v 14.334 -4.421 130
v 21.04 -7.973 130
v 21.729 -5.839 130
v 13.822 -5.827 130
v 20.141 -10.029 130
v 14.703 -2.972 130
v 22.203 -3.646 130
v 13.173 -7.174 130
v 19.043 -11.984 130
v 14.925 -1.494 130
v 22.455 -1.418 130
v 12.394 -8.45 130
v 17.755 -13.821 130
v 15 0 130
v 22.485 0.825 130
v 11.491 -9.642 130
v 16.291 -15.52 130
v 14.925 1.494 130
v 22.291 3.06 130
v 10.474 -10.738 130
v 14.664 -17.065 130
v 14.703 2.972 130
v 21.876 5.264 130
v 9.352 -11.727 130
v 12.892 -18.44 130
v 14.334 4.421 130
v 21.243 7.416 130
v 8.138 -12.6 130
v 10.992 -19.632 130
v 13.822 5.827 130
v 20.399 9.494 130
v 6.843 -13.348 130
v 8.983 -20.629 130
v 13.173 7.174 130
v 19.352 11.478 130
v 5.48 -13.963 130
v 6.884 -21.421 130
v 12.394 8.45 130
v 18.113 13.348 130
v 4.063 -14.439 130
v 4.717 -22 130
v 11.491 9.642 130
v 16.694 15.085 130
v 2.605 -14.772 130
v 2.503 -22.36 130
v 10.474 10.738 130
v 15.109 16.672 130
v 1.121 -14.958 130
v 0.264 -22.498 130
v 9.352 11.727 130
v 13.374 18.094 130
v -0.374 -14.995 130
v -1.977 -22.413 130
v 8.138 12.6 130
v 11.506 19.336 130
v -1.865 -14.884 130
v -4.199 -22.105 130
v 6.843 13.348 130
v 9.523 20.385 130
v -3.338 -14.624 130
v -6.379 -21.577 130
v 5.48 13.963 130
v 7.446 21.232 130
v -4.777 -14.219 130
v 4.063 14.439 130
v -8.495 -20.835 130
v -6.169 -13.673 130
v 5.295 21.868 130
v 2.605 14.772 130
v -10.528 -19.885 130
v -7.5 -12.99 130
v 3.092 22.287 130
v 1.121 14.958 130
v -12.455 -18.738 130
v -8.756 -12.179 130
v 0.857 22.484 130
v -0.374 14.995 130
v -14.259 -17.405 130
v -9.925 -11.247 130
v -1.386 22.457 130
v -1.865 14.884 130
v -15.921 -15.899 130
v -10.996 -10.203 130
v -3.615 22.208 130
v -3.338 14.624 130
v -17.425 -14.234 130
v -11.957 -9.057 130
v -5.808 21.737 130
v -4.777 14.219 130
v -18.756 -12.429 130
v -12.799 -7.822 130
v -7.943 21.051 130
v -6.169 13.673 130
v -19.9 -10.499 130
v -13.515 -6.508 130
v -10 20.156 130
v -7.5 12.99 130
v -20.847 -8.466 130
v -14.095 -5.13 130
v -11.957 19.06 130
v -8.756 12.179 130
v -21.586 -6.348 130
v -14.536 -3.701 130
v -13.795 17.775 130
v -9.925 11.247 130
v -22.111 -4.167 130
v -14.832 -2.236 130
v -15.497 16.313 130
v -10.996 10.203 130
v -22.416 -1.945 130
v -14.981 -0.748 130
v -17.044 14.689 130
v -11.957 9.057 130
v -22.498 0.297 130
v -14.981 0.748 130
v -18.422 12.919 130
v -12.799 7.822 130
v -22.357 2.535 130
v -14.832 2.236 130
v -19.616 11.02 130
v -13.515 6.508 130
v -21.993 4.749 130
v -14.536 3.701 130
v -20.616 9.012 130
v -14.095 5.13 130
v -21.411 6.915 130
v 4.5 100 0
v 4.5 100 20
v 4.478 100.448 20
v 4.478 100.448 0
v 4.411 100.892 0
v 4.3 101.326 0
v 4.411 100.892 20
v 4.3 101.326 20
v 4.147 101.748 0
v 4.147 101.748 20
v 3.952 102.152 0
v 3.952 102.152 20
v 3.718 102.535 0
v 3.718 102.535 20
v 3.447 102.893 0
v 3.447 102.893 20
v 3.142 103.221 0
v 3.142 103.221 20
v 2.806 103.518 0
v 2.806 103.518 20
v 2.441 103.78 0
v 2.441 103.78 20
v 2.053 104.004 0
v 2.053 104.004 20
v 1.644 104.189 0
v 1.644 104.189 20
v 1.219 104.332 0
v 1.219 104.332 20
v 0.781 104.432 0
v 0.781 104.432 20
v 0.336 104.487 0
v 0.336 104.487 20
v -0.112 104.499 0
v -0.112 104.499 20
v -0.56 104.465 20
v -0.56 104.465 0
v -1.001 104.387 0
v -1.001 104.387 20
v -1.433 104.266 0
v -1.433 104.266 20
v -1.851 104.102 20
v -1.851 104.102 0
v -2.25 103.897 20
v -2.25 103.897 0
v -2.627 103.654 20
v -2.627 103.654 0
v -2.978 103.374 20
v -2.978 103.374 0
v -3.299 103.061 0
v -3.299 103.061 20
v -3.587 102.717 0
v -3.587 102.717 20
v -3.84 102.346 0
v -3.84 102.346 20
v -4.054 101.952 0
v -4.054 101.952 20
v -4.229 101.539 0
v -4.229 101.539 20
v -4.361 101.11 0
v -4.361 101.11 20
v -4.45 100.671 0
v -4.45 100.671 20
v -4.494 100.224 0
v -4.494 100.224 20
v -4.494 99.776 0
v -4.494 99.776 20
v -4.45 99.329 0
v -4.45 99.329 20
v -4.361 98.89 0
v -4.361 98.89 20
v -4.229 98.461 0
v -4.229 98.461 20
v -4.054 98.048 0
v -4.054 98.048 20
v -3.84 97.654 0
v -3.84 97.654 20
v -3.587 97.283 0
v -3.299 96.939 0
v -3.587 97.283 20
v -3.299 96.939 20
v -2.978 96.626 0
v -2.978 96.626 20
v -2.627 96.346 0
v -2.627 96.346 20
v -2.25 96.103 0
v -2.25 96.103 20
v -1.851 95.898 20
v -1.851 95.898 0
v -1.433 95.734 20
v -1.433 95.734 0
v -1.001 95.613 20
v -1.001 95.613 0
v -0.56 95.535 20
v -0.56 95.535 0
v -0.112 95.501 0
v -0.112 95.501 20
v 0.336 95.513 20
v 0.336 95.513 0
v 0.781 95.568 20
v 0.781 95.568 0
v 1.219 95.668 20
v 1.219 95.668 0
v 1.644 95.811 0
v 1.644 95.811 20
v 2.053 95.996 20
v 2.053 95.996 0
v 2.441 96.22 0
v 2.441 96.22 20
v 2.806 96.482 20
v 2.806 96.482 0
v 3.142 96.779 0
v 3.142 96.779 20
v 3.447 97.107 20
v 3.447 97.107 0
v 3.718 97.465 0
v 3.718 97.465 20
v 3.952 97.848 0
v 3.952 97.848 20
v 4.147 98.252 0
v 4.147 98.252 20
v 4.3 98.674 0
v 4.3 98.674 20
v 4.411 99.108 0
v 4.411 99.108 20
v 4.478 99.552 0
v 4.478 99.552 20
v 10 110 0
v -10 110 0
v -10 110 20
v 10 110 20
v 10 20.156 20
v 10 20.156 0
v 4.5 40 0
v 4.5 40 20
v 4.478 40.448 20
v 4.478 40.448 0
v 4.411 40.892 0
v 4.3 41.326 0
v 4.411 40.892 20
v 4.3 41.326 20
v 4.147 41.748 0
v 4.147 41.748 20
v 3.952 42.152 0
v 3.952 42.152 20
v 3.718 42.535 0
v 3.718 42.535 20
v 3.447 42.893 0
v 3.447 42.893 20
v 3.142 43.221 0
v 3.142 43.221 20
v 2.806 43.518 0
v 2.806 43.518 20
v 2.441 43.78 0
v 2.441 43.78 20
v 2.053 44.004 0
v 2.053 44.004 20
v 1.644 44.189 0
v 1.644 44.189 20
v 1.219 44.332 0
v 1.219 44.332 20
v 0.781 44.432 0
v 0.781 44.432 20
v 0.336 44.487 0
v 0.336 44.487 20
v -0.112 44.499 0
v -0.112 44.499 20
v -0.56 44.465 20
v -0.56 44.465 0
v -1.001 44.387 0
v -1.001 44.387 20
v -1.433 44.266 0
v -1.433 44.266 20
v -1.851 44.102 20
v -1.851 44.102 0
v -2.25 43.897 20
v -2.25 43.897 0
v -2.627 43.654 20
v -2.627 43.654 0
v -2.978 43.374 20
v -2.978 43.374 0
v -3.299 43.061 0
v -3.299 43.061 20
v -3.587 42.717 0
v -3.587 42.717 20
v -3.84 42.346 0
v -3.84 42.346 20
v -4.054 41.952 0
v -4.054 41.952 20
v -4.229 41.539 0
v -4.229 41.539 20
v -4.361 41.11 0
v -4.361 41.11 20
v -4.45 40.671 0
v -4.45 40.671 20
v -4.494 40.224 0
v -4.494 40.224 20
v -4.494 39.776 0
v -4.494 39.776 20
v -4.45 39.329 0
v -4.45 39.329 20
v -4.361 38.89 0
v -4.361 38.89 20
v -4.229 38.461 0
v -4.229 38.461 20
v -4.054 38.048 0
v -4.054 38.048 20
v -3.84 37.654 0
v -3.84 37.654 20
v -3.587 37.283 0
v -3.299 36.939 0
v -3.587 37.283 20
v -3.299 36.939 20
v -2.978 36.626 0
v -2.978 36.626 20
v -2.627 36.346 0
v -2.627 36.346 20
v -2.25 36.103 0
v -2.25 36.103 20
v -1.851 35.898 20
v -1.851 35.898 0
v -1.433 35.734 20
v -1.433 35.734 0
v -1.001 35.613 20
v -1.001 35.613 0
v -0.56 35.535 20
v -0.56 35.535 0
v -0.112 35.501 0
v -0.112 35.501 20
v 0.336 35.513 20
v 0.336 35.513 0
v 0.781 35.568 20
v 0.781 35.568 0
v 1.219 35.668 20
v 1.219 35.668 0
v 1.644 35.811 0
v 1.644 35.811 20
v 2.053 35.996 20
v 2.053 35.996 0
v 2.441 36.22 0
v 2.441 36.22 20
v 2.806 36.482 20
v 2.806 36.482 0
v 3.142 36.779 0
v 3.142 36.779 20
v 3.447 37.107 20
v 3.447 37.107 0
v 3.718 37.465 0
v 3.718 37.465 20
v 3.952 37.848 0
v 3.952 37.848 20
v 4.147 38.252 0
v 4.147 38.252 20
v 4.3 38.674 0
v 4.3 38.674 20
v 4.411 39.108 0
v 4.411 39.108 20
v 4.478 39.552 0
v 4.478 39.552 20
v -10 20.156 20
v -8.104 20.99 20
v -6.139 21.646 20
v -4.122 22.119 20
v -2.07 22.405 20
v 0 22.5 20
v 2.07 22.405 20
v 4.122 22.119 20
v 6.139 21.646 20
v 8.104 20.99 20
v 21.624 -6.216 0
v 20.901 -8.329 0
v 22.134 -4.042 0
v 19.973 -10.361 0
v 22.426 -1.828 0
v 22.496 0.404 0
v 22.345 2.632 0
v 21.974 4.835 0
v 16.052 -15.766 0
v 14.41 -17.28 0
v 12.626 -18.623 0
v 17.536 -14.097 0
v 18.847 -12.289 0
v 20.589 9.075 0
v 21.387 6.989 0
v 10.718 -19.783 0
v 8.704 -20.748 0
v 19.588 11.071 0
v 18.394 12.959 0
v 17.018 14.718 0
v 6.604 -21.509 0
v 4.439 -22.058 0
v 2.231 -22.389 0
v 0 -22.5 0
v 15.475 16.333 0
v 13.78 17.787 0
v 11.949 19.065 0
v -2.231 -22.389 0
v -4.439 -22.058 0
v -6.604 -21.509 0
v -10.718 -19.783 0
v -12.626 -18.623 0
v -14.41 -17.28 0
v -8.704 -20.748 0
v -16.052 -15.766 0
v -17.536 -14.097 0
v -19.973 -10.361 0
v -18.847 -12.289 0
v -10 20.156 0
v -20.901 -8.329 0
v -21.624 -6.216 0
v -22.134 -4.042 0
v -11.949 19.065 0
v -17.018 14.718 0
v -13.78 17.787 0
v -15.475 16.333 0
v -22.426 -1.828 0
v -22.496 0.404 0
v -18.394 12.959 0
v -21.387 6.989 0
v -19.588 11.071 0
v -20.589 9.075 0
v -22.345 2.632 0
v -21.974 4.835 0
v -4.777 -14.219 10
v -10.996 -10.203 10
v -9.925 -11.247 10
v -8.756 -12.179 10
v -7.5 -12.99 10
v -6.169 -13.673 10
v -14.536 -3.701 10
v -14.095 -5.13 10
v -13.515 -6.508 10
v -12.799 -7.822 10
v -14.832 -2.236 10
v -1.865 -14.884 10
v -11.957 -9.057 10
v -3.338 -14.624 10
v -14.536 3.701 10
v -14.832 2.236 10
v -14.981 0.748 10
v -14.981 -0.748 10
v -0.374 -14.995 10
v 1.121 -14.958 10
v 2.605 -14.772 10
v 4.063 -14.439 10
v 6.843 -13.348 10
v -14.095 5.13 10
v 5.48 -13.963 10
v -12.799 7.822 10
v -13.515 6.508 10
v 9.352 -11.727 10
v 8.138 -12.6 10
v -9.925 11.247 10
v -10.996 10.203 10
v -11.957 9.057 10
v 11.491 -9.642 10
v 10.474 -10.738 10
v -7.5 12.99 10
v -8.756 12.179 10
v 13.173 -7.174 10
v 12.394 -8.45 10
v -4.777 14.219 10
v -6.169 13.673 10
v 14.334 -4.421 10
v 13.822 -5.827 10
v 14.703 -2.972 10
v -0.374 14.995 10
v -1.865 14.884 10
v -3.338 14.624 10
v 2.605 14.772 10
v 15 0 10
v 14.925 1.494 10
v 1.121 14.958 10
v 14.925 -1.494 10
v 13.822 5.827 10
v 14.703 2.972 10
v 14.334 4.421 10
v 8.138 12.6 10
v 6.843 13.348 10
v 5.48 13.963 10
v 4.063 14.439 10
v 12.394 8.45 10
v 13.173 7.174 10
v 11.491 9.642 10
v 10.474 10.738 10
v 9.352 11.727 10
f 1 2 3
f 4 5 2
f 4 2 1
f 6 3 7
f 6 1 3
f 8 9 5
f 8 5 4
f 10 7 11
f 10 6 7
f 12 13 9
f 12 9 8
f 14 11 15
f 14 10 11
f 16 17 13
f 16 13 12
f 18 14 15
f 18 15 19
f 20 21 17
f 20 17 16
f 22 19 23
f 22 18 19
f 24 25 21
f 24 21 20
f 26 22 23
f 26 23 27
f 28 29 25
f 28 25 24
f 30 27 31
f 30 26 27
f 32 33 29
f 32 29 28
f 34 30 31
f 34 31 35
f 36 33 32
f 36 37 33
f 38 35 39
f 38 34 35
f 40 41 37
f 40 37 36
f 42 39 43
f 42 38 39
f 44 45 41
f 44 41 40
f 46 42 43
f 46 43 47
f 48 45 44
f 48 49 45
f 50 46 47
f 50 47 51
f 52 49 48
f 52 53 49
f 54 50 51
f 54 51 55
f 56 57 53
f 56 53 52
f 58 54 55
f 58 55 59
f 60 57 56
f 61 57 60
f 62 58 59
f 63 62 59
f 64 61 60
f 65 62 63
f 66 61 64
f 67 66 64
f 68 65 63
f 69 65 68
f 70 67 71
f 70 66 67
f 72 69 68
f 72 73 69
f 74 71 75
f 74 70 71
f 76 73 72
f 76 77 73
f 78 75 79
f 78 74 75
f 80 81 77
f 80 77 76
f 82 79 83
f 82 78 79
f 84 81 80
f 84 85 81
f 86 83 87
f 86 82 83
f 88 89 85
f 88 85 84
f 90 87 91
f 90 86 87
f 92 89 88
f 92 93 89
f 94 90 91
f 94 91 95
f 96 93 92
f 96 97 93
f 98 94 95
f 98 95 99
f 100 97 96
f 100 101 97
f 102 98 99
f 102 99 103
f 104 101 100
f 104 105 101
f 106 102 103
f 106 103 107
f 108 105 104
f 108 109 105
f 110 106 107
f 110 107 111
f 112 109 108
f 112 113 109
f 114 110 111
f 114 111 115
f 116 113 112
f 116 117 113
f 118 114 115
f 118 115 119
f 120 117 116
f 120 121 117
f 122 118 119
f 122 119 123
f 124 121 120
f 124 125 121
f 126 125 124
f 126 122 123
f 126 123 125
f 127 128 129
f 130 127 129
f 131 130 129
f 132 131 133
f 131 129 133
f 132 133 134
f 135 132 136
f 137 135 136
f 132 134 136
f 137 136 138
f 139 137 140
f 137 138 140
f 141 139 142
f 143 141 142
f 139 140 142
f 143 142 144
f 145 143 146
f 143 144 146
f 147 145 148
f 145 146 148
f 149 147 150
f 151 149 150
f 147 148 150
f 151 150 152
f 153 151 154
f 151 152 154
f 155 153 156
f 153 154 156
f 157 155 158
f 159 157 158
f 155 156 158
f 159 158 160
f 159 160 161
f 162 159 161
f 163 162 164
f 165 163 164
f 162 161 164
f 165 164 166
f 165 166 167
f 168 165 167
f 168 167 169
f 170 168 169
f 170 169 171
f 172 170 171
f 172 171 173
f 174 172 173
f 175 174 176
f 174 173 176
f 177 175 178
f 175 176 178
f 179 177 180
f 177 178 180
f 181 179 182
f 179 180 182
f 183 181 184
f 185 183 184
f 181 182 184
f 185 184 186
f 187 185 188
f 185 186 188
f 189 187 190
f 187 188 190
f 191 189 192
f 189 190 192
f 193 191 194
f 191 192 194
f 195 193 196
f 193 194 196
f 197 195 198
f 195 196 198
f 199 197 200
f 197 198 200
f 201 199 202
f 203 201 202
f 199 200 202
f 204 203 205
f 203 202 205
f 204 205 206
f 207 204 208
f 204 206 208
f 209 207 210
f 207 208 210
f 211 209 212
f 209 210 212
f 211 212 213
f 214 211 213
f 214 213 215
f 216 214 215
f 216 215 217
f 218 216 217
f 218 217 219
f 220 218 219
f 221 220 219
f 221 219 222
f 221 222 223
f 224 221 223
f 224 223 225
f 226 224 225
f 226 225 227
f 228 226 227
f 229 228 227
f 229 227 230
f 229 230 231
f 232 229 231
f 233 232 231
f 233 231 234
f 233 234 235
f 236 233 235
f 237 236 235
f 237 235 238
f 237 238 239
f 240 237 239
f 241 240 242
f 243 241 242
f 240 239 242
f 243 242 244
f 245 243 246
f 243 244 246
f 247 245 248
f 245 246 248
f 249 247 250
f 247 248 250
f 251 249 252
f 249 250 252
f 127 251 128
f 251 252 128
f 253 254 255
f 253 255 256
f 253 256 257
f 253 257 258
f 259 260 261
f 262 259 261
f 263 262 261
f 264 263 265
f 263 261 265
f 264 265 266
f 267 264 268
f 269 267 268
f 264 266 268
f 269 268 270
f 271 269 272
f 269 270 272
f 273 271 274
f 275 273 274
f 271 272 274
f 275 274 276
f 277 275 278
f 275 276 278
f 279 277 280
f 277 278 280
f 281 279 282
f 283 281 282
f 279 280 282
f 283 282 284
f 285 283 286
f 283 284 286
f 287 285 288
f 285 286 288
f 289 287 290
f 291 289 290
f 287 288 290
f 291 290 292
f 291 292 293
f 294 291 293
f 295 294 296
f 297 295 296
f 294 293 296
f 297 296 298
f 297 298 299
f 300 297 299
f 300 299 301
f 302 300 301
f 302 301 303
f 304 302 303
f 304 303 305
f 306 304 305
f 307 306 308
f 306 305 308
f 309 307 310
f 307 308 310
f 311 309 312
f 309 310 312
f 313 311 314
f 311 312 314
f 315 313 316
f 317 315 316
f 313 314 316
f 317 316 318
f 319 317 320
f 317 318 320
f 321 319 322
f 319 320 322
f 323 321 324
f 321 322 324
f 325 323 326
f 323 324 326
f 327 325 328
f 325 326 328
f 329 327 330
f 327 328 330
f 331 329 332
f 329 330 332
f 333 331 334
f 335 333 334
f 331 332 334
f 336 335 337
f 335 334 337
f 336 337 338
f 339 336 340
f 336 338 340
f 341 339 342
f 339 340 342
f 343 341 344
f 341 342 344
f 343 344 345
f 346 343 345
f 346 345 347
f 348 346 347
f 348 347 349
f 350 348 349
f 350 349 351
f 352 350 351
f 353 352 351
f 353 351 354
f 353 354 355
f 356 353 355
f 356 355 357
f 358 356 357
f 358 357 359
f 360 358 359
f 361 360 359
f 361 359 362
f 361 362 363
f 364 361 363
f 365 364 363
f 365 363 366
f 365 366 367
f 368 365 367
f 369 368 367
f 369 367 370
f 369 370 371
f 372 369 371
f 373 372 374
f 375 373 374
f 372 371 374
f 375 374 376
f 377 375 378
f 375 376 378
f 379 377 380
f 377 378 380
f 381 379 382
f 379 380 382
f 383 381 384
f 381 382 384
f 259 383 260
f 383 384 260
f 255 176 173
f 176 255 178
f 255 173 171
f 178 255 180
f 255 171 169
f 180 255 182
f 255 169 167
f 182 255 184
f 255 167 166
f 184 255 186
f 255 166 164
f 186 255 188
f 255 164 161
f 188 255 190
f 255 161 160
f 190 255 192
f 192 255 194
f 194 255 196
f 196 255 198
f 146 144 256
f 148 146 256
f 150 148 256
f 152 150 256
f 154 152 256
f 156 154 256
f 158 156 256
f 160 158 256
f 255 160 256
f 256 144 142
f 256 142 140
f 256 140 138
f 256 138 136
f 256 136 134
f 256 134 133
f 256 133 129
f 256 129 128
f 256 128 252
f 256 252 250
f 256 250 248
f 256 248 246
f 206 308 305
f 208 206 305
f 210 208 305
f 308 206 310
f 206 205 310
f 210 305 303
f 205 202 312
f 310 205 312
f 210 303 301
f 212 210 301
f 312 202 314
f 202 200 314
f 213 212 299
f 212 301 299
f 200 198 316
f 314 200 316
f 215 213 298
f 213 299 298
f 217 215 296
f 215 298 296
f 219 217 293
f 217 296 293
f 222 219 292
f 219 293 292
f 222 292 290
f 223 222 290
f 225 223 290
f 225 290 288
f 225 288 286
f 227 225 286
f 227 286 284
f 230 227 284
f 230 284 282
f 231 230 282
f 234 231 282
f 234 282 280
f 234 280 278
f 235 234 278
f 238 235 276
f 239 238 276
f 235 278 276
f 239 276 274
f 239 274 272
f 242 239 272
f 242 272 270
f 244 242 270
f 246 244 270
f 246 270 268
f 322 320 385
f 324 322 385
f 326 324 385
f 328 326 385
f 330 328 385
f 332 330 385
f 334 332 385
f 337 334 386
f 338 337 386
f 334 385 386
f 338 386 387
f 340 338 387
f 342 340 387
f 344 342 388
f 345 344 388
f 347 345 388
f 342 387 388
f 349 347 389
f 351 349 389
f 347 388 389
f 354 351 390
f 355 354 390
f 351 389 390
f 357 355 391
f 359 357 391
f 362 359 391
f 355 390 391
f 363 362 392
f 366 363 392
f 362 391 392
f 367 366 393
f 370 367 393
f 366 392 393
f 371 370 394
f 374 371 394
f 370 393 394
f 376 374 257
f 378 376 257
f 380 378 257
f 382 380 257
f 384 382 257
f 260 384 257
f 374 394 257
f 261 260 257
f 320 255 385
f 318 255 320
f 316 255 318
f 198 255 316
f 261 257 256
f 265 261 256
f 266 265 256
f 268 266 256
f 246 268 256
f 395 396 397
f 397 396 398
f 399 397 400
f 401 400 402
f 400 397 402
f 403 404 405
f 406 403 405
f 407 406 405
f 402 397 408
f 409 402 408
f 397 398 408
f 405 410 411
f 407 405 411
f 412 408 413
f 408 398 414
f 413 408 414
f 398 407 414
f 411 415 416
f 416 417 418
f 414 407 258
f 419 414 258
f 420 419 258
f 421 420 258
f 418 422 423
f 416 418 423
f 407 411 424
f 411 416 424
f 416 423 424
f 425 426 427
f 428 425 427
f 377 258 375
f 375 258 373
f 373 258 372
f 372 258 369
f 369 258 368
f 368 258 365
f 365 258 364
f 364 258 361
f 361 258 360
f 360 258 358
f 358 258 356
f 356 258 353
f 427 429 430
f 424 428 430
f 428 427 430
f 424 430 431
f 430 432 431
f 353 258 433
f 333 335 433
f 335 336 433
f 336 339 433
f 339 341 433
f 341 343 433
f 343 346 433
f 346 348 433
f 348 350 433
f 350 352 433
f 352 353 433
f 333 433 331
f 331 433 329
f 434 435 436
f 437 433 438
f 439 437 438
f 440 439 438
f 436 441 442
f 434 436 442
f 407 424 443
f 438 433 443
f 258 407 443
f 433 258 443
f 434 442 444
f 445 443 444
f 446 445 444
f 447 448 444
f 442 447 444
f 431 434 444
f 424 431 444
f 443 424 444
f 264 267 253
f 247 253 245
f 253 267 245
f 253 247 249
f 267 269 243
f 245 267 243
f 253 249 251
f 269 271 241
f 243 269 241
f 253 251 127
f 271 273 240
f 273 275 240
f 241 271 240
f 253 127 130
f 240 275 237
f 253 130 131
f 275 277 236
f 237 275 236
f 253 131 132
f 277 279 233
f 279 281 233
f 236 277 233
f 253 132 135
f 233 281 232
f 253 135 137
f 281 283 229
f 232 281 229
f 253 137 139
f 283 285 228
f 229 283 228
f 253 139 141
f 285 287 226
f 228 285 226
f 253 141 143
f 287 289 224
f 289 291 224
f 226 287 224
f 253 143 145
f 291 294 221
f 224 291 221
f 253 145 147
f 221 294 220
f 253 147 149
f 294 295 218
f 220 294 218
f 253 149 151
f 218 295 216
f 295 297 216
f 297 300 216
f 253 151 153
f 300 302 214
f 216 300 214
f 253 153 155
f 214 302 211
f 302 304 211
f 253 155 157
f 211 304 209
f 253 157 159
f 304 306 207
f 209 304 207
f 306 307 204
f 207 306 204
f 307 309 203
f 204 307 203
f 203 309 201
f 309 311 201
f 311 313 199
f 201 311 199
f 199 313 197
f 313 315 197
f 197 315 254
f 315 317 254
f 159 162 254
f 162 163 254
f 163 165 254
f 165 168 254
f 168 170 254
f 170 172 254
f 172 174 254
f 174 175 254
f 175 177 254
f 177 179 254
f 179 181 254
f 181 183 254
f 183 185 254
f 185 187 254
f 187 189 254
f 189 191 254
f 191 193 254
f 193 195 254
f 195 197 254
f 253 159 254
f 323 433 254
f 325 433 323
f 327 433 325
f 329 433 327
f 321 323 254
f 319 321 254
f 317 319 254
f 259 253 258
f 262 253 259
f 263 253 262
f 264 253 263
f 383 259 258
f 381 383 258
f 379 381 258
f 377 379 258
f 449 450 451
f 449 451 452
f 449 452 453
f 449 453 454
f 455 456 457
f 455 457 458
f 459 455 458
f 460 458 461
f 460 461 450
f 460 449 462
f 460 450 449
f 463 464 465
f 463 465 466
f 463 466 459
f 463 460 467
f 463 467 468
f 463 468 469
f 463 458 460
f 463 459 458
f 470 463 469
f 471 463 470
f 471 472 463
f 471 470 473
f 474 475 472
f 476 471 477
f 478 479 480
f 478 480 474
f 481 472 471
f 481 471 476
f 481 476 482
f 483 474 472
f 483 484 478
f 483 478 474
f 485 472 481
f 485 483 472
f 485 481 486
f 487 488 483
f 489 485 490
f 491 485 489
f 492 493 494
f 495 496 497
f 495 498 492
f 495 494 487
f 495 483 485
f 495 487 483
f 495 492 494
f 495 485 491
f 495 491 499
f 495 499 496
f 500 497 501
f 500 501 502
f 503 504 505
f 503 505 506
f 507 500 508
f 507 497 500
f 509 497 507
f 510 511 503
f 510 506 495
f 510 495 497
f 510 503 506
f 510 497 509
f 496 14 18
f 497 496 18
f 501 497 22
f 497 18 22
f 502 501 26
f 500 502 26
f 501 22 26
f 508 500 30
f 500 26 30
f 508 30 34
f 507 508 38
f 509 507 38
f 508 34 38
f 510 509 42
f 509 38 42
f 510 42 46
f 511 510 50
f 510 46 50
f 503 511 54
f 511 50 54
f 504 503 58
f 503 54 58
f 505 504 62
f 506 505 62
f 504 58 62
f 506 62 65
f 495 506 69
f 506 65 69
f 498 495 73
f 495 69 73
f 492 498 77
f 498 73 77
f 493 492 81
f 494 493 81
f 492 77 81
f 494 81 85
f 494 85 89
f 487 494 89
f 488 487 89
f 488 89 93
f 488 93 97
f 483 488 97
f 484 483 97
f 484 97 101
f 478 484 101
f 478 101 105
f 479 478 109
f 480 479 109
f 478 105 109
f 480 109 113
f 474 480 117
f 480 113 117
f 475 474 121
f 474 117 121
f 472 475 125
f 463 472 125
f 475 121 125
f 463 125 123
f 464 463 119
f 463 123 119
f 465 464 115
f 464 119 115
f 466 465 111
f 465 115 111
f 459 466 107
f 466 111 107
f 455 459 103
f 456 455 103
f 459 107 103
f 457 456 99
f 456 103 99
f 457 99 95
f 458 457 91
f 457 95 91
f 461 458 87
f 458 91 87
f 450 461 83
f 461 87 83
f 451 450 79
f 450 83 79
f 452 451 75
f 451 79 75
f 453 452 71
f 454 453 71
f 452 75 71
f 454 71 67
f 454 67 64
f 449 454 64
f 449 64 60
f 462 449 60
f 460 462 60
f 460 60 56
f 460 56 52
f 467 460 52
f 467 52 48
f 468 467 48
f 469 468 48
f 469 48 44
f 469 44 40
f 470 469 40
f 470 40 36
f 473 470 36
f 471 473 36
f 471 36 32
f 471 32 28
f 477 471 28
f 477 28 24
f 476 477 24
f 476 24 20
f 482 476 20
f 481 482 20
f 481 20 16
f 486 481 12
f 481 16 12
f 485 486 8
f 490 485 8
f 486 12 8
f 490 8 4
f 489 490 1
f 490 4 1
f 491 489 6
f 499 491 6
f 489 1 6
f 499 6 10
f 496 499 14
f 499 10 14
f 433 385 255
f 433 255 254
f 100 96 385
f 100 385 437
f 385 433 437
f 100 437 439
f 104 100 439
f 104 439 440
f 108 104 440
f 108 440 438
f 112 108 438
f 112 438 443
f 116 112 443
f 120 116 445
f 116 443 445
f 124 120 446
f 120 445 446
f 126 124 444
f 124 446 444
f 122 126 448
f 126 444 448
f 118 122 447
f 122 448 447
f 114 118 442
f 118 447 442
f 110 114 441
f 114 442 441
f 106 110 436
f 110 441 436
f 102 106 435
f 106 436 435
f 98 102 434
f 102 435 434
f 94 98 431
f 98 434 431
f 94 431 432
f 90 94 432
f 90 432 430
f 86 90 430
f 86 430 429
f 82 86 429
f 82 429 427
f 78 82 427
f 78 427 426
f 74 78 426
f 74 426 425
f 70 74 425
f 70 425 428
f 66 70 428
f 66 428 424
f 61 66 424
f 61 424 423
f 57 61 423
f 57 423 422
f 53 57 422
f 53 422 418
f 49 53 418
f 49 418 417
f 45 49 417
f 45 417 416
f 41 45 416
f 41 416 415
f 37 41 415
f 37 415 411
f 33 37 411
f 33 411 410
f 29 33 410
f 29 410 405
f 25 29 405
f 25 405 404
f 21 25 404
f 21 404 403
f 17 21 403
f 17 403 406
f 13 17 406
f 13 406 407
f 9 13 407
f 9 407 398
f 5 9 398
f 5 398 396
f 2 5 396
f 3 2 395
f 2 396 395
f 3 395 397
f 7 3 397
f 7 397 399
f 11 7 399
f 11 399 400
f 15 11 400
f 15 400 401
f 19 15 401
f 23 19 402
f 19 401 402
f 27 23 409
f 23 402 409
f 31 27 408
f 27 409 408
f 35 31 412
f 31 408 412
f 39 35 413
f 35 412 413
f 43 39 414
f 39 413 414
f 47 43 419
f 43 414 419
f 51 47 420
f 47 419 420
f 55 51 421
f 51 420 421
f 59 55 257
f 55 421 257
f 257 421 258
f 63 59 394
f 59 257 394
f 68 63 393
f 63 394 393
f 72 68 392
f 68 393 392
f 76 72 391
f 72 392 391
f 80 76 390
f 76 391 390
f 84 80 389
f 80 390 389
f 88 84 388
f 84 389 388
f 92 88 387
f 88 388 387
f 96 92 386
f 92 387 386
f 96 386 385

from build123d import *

# Parameters (mm, degrees)
ESQUISSE1_R             = 22.5
BASE_EXTRUSION_DEPTH    = 130
ESQUISSE2_W             = 20
ESQUISSE2_H             = 20
BOSS_EXTRU_1_DEPTH      = 110
ESQUISSE3_R             = 4.5
ENL_V_MAT_EXTRU_1_DEPTH = 20
ESQUISSE4_R             = 15
ENL_V_MAT_EXTRU_2_DEPTH = 120


with BuildPart() as part:
    # Esquisse1 → Base-Extrusion (new body)
    with BuildSketch(Plane.XY):
        with Locations(Location((0, 0, 0), (0, 0, 116.387799961))):
            Circle(ESQUISSE1_R)
    extrude(amount=BASE_EXTRUSION_DEPTH)

    # Esquisse2 → Boss.-Extru.1 (add)
    with BuildSketch(Plane(origin=(0, 0, 0), x_dir=(1, 0, 0), z_dir=(0, 1, 0))):
        with Locations((0, -10)):
            Rectangle(ESQUISSE2_W, ESQUISSE2_H)
    extrude(amount=BOSS_EXTRU_1_DEPTH)

    # Esquisse3 → Enlèv. mat.-Extru.1 (cut)
    with BuildSketch(Plane.XY.offset(20)):
        with Locations((0, 100)):
            Circle(ESQUISSE3_R)
        with Locations((0, 40)):
            Circle(ESQUISSE3_R)
    extrude(amount=-ENL_V_MAT_EXTRU_1_DEPTH, mode=Mode.SUBTRACT)

    # Esquisse4 → Enlèv. mat.-Extru.2 (cut)
    with BuildSketch(Plane.XY.offset(130)):
        Circle(ESQUISSE4_R)
    extrude(amount=-ENL_V_MAT_EXTRU_2_DEPTH, mode=Mode.SUBTRACT)


solid = part.part
